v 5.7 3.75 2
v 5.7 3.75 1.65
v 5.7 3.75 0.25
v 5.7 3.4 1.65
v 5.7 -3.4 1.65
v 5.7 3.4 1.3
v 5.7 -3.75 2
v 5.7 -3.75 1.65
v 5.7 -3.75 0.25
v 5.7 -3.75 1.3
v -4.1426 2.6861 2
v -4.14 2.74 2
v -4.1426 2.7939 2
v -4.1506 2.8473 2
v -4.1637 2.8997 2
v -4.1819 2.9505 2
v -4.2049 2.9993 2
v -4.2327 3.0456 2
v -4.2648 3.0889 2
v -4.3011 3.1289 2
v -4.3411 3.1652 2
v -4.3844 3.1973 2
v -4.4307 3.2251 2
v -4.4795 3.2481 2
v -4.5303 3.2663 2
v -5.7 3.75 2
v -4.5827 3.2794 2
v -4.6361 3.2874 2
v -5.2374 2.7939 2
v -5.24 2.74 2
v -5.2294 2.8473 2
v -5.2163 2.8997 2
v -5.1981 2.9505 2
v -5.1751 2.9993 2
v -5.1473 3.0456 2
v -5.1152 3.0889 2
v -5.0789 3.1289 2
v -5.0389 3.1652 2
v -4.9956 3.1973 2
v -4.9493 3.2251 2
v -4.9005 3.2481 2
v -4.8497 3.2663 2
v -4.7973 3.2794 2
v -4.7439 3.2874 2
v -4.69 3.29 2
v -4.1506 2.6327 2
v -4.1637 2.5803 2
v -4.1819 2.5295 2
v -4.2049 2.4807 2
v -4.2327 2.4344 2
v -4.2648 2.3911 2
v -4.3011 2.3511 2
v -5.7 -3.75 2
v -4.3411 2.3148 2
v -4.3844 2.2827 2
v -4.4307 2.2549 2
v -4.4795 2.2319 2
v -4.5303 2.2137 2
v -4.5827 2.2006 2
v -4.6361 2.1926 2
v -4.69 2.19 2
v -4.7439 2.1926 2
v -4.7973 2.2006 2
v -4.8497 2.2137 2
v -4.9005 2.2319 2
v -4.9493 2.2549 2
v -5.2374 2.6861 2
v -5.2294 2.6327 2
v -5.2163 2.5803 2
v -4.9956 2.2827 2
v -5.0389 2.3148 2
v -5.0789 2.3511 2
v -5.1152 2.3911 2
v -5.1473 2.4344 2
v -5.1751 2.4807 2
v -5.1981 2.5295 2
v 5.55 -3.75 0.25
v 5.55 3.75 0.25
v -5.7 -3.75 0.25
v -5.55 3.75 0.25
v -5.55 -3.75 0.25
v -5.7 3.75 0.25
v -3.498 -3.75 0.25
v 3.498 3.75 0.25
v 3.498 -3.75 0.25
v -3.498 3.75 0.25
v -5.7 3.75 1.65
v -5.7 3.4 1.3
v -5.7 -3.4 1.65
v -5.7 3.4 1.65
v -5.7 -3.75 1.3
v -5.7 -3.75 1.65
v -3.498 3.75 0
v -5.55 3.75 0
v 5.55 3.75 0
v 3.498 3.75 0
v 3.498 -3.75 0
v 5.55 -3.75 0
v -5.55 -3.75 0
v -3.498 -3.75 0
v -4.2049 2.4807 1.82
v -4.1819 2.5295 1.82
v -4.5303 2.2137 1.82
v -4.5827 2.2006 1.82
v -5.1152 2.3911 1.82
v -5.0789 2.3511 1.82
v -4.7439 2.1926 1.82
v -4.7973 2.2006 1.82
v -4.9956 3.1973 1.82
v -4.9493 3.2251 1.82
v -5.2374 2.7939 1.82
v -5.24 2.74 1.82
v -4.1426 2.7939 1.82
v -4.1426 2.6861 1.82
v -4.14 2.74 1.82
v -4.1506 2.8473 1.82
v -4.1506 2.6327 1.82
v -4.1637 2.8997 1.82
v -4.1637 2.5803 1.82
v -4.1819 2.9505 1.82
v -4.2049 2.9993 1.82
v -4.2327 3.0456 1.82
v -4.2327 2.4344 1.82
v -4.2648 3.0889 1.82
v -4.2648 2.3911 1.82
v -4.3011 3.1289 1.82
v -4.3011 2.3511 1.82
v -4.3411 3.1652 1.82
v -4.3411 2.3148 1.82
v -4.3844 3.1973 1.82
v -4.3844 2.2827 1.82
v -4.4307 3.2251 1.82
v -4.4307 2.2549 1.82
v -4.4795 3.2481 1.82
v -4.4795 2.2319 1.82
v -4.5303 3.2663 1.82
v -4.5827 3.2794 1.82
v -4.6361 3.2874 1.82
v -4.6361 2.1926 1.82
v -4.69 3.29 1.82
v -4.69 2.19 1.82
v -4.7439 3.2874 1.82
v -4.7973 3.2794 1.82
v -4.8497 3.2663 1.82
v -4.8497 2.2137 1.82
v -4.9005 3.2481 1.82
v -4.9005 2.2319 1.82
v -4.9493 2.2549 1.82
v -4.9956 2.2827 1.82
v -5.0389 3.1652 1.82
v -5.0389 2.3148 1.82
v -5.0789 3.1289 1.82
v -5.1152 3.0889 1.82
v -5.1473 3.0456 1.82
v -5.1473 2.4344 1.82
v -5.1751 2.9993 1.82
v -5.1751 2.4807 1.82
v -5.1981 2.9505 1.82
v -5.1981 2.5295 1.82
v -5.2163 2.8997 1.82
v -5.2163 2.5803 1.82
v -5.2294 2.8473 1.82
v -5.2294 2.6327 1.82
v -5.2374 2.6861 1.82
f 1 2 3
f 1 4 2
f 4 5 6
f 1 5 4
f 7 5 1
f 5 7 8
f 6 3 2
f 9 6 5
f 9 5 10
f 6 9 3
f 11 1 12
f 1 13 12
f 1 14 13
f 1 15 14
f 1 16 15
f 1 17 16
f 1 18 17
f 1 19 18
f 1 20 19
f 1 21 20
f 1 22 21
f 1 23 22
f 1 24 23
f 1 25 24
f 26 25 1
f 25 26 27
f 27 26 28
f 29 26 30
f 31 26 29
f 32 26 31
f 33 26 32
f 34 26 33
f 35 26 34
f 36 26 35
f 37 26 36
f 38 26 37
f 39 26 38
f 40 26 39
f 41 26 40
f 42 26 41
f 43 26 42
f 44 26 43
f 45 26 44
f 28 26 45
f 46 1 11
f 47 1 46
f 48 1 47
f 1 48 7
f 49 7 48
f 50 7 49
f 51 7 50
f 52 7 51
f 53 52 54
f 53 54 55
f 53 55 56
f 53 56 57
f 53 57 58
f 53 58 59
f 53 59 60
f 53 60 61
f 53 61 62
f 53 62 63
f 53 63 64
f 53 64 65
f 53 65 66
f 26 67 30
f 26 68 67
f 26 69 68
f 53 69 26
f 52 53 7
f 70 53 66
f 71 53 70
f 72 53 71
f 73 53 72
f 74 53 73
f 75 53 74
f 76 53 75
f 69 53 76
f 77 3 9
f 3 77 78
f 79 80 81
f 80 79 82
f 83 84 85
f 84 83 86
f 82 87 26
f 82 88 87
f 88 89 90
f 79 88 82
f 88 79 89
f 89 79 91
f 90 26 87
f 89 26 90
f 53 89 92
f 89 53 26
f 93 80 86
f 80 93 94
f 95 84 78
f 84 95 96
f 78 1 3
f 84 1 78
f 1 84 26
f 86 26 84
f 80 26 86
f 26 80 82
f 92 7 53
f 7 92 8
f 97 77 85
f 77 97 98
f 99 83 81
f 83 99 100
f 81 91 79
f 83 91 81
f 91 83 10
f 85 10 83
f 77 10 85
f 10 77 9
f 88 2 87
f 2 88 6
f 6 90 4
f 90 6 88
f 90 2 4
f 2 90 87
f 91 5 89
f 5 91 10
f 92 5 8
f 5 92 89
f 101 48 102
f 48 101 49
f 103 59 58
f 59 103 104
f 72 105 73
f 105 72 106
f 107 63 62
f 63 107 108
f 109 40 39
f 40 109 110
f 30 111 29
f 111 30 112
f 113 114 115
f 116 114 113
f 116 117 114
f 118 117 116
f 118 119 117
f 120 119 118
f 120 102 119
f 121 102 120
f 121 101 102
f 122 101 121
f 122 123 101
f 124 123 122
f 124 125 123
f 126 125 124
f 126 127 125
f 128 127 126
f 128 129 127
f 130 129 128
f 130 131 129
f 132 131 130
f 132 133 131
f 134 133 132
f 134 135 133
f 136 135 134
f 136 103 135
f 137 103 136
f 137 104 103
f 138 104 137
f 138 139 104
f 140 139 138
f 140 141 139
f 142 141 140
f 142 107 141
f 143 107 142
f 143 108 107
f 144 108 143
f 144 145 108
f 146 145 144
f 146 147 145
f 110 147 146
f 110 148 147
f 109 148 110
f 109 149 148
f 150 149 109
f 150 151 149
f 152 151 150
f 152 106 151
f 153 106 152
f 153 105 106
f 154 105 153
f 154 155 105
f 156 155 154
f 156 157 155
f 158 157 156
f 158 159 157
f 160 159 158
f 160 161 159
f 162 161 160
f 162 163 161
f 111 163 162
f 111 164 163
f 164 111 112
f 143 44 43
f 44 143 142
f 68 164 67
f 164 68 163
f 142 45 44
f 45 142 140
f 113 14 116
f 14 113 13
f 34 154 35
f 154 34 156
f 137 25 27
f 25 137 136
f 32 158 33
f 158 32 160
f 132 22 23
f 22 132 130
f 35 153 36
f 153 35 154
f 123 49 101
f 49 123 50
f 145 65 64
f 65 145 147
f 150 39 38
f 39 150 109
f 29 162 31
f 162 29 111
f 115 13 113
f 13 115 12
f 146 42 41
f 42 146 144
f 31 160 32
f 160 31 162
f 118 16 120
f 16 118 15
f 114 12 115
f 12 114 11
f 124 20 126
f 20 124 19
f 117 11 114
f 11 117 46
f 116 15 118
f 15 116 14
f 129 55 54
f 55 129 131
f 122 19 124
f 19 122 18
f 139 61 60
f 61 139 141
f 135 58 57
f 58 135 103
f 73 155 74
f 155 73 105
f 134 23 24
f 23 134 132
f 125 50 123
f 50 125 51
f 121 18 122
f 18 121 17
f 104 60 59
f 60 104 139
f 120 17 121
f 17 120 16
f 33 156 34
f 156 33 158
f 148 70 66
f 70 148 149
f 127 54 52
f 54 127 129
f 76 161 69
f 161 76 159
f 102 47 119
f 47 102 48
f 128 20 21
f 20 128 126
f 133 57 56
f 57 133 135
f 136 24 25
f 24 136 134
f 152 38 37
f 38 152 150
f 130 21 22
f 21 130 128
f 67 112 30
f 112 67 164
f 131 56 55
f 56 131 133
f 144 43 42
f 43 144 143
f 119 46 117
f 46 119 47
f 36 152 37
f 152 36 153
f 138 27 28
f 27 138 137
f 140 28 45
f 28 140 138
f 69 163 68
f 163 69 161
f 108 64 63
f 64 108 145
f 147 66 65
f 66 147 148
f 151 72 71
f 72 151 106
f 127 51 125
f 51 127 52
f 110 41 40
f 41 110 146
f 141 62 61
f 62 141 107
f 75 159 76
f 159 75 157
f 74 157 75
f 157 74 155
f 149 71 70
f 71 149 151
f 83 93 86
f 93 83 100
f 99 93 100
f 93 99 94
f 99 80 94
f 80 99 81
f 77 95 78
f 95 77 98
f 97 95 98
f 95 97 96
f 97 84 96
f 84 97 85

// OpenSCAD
$fn = 64;

size = [11.40, 7.50, 2.00];

module smd(sz=[11.40,7.50,2.00]) {
    L = sz[0];
    W = sz[1];
    H = sz[2];

    // Feature proportions (kept within overall size)
    pad_t   = min(0.25, H*0.18);          // terminal thickness
    pad_len = min(L*0.18, 2.2);           // terminal length along X
    pad_in  = 0.15;                       // slight inset from ends
    chamfer = min(0.35, H*0.25);          // top edge chamfer
    mark_r  = min(0.55, min(L,W)*0.08);   // polarity mark radius
    mark_d  = min(0.18, H*0.12);          // polarity mark depth

    // Body dimensions (body + pads = overall H)
    bodyH = H - pad_t;

    union() {
        // Main body with top chamfer (single connected solid)
        translate([0, 0, pad_t])
        difference() {
            translate([-L/2, -W/2, 0]) cube([L, W, bodyH], center=false);

            // Chamfer the four top edges by subtracting wedges
            // Along +Y top edge
            translate([-L/2 - 0.01,  W/2 - chamfer, bodyH - chamfer])
                rotate([0, 90, 0])
                    linear_extrude(height=L + 0.02)
                        polygon(points=[[0,0],[chamfer,0],[0,chamfer]]);
            // Along -Y top edge
            translate([-L/2 - 0.01, -W/2, bodyH - chamfer])
                rotate([0, 90, 0])
                    linear_extrude(height=L + 0.02)
                        polygon(points=[[0,0],[chamfer,0],[0,chamfer]]);
            // Along +X top edge
            translate([ L/2 - chamfer, -W/2 - 0.01, bodyH - chamfer])
                rotate([90, 0, 0])
                    linear_extrude(height=W + 0.02)
                        polygon(points=[[0,0],[chamfer,0],[0,chamfer]]);
            // Along -X top edge
            translate([-L/2, -W/2 - 0.01, bodyH - chamfer])
                rotate([90, 0, 0])
                    linear_extrude(height=W + 0.02)
                        polygon(points=[[0,0],[chamfer,0],[0,chamfer]]);

            // Polarity mark: shallow dimple on top near (-X, +Y) corner
            translate([-L/2 + chamfer + mark_r*1.2, W/2 - chamfer - mark_r*1.2, bodyH - mark_d])
                cylinder(h=mark_d + 0.02, r=mark_r, center=false);
        }

        // Terminals/pads (connected to body via overlap)
        overlap = 0.05;

        // Left pad
        translate([-L/2 + pad_in, -W/2, 0])
            cube([pad_len, W, pad_t + overlap], center=false);

        // Right pad
        translate([L/2 - pad_in - pad_len, -W/2, 0])
            cube([pad_len, W, pad_t + overlap], center=false);
    }
}

smd(size);
